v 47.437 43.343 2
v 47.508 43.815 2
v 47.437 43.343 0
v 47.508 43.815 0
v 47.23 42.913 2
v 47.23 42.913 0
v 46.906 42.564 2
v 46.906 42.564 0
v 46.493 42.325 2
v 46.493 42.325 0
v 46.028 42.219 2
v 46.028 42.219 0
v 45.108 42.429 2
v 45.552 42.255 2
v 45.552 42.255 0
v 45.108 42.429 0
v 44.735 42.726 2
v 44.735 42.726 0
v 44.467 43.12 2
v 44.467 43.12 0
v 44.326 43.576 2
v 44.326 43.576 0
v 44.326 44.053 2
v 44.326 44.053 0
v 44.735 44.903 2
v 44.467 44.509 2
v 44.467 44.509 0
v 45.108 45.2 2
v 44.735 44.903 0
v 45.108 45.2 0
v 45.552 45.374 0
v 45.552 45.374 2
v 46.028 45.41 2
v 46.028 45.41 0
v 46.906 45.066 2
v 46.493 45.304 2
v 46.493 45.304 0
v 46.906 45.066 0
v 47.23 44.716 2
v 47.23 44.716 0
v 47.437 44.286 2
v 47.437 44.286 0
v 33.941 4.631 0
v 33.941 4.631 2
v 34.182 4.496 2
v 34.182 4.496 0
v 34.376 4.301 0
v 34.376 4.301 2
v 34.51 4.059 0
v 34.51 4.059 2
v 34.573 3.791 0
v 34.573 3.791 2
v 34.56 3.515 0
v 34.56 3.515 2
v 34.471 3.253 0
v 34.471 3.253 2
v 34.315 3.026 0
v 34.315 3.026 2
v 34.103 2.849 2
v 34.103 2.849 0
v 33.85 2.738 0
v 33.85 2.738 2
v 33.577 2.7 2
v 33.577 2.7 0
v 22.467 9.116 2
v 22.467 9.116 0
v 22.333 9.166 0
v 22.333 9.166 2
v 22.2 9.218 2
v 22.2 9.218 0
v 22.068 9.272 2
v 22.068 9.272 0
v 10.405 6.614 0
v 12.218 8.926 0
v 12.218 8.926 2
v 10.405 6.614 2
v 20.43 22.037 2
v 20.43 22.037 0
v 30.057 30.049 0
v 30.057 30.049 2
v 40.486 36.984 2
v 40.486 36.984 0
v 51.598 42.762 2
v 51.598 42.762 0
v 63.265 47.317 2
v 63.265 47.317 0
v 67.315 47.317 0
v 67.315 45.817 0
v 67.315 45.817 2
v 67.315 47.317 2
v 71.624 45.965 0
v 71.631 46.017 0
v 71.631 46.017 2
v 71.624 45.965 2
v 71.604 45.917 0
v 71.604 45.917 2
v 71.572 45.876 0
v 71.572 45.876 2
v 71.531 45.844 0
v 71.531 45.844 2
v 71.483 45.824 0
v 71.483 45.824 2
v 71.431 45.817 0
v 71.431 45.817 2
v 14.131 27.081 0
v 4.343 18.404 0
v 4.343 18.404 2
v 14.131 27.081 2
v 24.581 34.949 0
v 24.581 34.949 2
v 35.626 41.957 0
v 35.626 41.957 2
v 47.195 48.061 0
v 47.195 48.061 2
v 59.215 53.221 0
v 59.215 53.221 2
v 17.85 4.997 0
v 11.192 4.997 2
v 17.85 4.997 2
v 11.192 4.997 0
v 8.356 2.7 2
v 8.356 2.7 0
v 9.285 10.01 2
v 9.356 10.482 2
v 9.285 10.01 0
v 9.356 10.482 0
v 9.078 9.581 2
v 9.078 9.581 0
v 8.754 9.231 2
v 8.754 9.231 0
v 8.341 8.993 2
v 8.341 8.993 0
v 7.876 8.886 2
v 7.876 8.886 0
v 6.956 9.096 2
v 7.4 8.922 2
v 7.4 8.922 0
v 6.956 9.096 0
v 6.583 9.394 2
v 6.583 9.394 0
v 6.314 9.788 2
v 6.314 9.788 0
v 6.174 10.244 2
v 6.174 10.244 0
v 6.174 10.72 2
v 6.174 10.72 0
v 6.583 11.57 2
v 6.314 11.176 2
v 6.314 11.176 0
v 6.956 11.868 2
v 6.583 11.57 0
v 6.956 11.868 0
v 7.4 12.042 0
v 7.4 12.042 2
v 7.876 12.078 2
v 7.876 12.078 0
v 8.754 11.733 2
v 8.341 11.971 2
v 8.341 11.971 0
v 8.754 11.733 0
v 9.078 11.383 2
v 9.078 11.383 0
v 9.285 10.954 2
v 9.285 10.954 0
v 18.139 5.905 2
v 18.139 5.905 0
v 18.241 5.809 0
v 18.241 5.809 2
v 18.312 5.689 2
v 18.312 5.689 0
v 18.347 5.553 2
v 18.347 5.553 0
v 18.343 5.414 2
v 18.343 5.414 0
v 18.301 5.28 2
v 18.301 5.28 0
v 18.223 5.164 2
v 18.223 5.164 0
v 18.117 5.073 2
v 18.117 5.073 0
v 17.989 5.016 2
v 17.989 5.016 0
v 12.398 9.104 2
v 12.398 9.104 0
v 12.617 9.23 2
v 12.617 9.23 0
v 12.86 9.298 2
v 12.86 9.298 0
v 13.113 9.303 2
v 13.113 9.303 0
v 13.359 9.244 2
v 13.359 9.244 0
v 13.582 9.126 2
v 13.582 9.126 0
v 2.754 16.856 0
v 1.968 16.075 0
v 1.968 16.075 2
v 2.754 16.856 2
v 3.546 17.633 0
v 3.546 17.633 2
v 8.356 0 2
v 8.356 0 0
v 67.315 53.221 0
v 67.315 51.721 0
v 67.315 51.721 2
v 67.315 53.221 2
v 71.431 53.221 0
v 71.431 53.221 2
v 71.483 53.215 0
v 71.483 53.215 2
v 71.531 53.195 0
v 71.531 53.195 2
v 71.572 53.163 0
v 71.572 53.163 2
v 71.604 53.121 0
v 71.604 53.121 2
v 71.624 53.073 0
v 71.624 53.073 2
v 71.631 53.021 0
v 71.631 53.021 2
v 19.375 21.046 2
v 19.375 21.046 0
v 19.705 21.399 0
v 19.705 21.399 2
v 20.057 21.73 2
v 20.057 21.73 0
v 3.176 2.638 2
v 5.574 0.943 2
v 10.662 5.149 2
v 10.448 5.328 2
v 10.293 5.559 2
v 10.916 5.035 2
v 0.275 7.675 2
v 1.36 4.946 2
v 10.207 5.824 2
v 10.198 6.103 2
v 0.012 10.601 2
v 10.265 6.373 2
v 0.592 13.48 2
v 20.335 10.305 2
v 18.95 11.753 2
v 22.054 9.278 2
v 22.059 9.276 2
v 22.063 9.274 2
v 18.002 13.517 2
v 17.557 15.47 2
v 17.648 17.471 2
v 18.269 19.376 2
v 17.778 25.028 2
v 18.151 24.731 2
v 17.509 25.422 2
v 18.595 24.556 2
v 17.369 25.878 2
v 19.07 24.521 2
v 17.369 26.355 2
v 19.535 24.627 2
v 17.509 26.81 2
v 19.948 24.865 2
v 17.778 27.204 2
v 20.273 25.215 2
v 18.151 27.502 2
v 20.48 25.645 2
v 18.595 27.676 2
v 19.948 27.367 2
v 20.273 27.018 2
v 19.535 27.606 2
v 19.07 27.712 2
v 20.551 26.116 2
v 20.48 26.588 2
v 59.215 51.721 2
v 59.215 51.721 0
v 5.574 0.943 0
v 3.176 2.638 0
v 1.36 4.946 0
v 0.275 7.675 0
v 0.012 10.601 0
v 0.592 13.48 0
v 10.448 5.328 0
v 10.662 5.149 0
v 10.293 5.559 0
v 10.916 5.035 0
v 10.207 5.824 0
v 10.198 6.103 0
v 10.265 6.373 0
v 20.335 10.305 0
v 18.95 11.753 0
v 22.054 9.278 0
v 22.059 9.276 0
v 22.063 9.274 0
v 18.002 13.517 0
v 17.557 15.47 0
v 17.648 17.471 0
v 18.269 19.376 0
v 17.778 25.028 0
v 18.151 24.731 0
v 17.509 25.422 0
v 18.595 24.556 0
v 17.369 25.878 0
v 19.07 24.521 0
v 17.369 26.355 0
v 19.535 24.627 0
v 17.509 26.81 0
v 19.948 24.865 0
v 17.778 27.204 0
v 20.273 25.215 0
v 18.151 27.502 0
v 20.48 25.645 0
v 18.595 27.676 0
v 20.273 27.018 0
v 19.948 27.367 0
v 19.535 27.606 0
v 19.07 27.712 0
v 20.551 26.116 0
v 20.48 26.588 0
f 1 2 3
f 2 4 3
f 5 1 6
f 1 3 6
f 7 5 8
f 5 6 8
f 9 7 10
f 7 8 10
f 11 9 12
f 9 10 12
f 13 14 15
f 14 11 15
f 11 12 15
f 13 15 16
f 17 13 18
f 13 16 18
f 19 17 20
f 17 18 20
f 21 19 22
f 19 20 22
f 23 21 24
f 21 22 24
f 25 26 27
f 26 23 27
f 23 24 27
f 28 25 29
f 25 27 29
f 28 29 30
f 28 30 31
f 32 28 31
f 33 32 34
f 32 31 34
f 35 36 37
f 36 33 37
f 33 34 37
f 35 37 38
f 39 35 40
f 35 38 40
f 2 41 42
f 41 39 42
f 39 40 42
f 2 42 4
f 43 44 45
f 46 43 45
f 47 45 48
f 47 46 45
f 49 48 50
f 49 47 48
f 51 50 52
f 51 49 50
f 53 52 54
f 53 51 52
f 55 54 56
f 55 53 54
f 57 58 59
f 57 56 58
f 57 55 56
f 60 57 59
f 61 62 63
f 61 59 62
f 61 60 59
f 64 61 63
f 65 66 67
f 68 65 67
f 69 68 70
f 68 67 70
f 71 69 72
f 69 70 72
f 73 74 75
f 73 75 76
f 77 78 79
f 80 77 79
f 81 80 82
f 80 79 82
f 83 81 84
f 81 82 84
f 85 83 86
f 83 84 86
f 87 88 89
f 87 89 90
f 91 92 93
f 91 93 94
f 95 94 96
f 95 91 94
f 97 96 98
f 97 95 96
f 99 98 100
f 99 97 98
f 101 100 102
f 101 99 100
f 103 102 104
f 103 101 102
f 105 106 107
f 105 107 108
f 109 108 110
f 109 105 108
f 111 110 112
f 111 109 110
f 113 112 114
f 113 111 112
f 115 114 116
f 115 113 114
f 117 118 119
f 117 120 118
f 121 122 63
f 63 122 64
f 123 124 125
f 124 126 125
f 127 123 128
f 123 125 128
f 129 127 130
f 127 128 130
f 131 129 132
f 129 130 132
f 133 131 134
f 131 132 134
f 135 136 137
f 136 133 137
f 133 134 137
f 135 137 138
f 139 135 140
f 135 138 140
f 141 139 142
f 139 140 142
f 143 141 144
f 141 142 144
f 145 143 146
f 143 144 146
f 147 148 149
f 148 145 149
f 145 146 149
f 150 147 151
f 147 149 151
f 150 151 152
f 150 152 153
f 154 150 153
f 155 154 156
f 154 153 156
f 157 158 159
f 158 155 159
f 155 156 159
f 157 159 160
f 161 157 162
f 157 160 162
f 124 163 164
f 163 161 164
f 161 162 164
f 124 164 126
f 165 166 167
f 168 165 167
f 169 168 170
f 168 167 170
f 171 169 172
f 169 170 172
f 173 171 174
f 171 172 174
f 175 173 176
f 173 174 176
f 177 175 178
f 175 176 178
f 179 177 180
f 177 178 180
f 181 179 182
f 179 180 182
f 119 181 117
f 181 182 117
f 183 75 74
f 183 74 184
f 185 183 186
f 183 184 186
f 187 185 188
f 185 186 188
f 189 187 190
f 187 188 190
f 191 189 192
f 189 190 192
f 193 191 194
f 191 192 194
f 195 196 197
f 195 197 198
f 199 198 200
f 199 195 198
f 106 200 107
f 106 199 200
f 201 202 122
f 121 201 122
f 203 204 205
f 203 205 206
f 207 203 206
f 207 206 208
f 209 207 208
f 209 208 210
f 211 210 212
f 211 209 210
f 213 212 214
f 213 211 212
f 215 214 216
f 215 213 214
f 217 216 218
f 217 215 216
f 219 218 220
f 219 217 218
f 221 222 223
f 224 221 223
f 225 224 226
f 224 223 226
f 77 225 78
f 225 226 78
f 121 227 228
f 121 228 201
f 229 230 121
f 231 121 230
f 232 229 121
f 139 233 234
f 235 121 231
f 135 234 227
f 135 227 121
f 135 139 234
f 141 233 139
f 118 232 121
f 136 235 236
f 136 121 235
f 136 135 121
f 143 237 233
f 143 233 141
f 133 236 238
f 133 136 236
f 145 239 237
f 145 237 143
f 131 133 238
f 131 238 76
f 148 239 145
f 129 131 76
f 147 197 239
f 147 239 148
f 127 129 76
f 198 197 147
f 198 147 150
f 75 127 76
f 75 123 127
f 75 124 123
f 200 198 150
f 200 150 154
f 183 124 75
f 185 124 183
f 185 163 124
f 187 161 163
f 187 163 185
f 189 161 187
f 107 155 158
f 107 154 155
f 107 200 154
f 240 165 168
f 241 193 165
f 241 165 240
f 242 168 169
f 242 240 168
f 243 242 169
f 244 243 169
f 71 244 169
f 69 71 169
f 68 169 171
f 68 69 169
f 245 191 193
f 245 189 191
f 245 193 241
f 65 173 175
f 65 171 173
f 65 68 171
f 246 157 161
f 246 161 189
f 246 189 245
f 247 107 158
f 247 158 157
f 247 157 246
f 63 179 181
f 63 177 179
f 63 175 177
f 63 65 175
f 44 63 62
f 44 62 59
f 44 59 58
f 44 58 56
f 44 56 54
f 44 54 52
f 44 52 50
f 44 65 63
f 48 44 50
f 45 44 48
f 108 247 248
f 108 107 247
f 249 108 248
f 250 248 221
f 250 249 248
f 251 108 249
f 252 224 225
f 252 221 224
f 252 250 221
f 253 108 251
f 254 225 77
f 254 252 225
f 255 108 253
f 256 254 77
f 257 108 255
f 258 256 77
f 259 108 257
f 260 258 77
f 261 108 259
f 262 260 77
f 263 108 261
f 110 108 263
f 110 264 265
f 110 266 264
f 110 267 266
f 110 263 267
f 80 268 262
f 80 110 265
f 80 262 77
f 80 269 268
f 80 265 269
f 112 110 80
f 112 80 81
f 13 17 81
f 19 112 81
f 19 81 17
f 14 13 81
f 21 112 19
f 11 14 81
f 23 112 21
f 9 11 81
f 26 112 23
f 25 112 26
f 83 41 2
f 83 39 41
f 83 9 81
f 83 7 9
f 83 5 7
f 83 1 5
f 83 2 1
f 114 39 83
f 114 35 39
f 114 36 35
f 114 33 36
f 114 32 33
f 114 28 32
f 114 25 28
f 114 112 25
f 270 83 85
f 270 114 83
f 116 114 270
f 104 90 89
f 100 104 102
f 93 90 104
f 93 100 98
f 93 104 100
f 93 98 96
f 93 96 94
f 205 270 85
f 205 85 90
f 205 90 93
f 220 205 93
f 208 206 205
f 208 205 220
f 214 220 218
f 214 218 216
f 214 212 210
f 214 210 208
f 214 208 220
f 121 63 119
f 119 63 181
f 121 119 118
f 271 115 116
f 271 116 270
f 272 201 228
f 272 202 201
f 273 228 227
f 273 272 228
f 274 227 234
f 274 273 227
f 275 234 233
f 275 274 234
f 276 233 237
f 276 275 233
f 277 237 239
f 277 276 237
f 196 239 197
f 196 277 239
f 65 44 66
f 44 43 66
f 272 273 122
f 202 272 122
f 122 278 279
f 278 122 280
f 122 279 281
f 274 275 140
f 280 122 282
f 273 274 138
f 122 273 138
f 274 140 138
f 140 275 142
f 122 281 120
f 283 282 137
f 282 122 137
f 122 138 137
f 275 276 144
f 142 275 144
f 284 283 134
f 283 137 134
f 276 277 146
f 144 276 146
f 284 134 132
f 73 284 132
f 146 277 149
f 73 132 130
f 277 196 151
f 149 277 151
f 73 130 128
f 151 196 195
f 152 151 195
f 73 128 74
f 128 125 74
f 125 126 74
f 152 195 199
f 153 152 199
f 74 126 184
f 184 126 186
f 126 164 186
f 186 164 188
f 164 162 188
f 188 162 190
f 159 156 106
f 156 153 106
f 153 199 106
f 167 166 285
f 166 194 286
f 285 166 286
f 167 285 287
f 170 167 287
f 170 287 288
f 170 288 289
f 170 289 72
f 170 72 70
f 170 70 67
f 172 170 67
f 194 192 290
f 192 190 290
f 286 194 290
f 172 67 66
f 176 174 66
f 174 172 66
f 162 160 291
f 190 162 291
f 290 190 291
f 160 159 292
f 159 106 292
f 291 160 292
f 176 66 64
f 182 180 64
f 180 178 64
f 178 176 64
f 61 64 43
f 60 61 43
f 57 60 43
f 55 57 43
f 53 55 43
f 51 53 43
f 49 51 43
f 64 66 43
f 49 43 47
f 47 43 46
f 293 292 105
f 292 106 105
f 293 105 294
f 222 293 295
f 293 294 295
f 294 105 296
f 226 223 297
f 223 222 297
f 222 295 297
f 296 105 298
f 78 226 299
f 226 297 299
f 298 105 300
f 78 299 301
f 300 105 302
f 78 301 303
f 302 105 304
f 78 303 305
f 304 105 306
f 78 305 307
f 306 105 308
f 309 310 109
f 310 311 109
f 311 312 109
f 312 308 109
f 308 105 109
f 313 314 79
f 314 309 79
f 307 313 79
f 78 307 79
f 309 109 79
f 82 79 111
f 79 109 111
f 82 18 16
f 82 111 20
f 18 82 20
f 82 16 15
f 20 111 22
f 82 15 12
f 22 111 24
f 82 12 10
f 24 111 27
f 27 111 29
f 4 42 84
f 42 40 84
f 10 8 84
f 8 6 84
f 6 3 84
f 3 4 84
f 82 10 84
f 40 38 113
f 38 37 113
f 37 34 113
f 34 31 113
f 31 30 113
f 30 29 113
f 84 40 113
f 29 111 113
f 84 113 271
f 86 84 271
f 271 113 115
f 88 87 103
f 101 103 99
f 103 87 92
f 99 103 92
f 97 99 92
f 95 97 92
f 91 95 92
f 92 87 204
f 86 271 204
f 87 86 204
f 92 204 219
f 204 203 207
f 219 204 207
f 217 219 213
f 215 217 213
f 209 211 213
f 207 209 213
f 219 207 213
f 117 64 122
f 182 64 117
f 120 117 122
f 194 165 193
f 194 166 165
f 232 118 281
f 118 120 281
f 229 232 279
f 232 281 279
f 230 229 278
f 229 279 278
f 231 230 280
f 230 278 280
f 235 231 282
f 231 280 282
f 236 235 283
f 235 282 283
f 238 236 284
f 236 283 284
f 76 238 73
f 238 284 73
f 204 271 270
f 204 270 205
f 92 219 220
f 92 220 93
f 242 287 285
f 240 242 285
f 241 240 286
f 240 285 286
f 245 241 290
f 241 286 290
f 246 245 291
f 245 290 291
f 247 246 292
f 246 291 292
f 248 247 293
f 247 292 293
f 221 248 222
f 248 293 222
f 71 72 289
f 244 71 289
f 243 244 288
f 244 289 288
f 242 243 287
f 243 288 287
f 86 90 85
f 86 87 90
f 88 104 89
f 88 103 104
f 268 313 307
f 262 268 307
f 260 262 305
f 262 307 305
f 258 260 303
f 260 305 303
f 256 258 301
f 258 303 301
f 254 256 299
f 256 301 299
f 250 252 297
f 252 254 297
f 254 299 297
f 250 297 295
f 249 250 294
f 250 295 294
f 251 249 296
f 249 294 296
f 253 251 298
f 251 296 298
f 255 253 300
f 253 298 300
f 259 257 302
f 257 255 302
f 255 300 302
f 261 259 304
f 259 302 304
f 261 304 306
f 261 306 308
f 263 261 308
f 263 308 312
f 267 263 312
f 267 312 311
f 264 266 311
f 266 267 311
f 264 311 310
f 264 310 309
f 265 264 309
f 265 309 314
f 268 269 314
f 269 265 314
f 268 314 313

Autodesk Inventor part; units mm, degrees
ref_plane "YZ Plane" through (0, 0, 0) normal (1, 0, 0) x (0, 1, 0)
ref_plane "XZ Plane" through (0, 0, 0) normal (0, 1, 0) x (-1, 0, 0)
ref_plane "XY Plane" through (0, 0, 0) normal (0, 0, 1) x (1, 0, 0)
sketch "Side Part" plane through (0, 0, 0) normal (0, 0, 1) x (1, 0, 0)
  arc A0 (59.2149, 53.2214) -> (1.9677, 16.0747) centre (117.7132, -99.6165) ccw
  arc A1 (63.2649, 47.3171) -> (19.3751, 21.046) centre (99.8299, -63.5681) ccw
  arc A2 (19.3751, 21.046) -> (22.0544, 9.2781) centre (24.9814, 16.1335) ccw
  arc A3 (1.9677, 16.0747) -> (8.356, 0) centre (10.2097, 10.0435) ccw
  circle A4 centre (18.9507, 26.1162) radius 1.6
  circle A5 centre (45.9082, 43.8146) radius 1.6
  line L0 (8.356, 0) -> (8.356, 2.7)
  line L1 (59.2149, 53.2214) -> (59.2149, 51.7214)
  line L2 (59.2149, 51.7214) -> (67.3149, 51.7214)
  line L3 (67.3149, 51.7214) -> (67.3149, 53.2214)
  line L4 (71.631, 46.0171) -> (71.631, 53.0214)
  line L5 (67.3149, 53.2214) -> (71.431, 53.2214)
  arc A6 (71.631, 53.0214) -> (71.431, 53.2214) centre (71.431, 53.0214) ccw
  arc A7 (22.0544, 9.2781) -> (22.0677, 9.2723) centre (22.1405, 9.4586) ccw
  circle A8 centre (7.756, 10.482) radius 1.6
  line L6 (12.2179, 8.9259) -> (10.405, 6.6138)
  arc A9 (10.405, 6.6138) -> (11.1919, 4.9967) centre (11.1919, 5.9967) ccw
  line L7 (11.1919, 4.9967) -> (17.8503, 4.9967)
  line L8 (18.1389, 5.9051) -> (13.582, 9.1255)
  arc A10 (17.8503, 4.9967) -> (18.1389, 5.9051) centre (17.8503, 5.4967) ccw
  arc A11 (13.582, 9.1255) -> (12.2179, 8.9259) centre (13.0048, 8.3088) ccw
  line L9 (8.356, 2.7) -> (33.5768, 2.7)
  arc A12 (33.5768, 2.7) -> (33.9408, 4.6314) centre (33.5768, 3.7) ccw
  line L10 (33.9408, 4.6314) -> (22.0677, 9.2723)
  line L11 (67.3149, 45.8171) -> (67.3149, 47.3171)
  line L12 (67.3149, 45.8171) -> (71.431, 45.8171)
  arc A13 (71.431, 45.8171) -> (71.631, 46.0171) centre (71.431, 46.0171) ccw
  line L13 (63.2649, 47.3171) -> (67.3149, 47.3171)
  point P0 (38.6259, 23.714)
sketch "Sketch1" plane through (0, 0, 0) normal (0, 0, 1) x (1, 0, 0)
  circle A0 centre (45.9082, 43.8146) radius 1.6
  circle A1 centre (18.9507, 26.1162) radius 1.6
  circle A2 centre (7.756, 10.482) radius 1.6
  arc A3 (10.405, 6.6138) -> (11.1919, 4.9967) centre (11.1919, 5.9967) ccw
  arc A4 (13.582, 9.1255) -> (12.2179, 8.9259) centre (13.0048, 8.3088) ccw
  arc A5 (17.8503, 4.9967) -> (18.1389, 5.9051) centre (17.8503, 5.4967) ccw
  arc A6 (20.4302, 22.0369) -> (22.4669, 9.1163) centre (24.9814, 16.1335) ccw
  arc A7 (33.5768, 2.7) -> (33.9408, 4.6314) centre (33.5768, 3.7) ccw
  arc A8 (4.3433, 18.4037) -> (8.356, 0) centre (10.2097, 10.0435) ccw
  line L0 (8.356, 0) -> (8.356, 2.7)
  line L1 (8.356, 2.7) -> (33.5768, 2.7)
  line L2 (33.9408, 4.6314) -> (22.4669, 9.1163)
  line L3 (18.1389, 5.9051) -> (13.582, 9.1255)
  line L4 (11.1919, 4.9967) -> (17.8503, 4.9967)
  line L5 (12.2179, 8.9259) -> (10.405, 6.6138)
  arc A9 (59.2149, 53.2214) -> (1.9677, 16.0747) centre (117.7132, -99.6165) ccw
  arc A10 (63.2649, 47.3171) -> (19.3751, 21.046) centre (99.8299, -63.5681) ccw
  line L6 (59.2149, 53.2214) -> (59.2149, 51.7214)
  line L7 (59.2149, 51.7214) -> (67.3149, 51.7214)
  line L8 (67.3149, 51.7214) -> (67.3149, 53.2214)
  arc A11 (71.631, 53.0214) -> (71.431, 53.2214) centre (71.431, 53.0214) ccw
  arc A12 (71.431, 45.8171) -> (71.631, 46.0171) centre (71.431, 46.0171) ccw
  line L9 (67.3149, 53.2214) -> (71.431, 53.2214)
  line L10 (71.631, 53.0214) -> (71.631, 46.0171)
  line L11 (71.431, 45.8171) -> (67.3149, 45.8171)
  line L12 (67.3149, 45.8171) -> (67.3149, 47.3171)
  line L13 (67.3149, 47.3171) -> (63.2649, 47.3171)
  arc A13 (59.2149, 53.2214) -> (1.9677, 16.0747) centre (117.7132, -99.6165) ccw
  arc A14 (63.2649, 47.3171) -> (19.3751, 21.046) centre (99.8299, -63.5681) ccw
  arc A15 (19.3751, 21.046) -> (22.0544, 9.2781) centre (24.9814, 16.1335) ccw
  arc A16 (1.9677, 16.0747) -> (8.356, 0) centre (10.2097, 10.0435) ccw
  circle A17 centre (18.9507, 26.1162) radius 1.6
  circle A18 centre (45.9082, 43.8146) radius 1.6
  line L14 (8.356, 0) -> (8.356, 2.7)
  line L15 (59.2149, 53.2214) -> (59.2149, 51.7214)
  line L16 (59.2149, 51.7214) -> (67.3149, 51.7214)
  line L17 (67.3149, 51.7214) -> (67.3149, 53.2214)
  line L18 (71.631, 46.0171) -> (71.631, 53.0214)
  line L19 (67.3149, 53.2214) -> (71.431, 53.2214)
  arc A19 (71.631, 53.0214) -> (71.431, 53.2214) centre (71.431, 53.0214) ccw
  arc A20 (22.0544, 9.2781) -> (22.0677, 9.2723) centre (22.1405, 9.4586) ccw
  circle A21 centre (7.756, 10.482) radius 1.6
  line L20 (12.2179, 8.9259) -> (10.405, 6.6138)
  arc A22 (10.405, 6.6138) -> (11.1919, 4.9967) centre (11.1919, 5.9967) ccw
  line L21 (11.1919, 4.9967) -> (17.8503, 4.9967)
  line L22 (18.1389, 5.9051) -> (13.582, 9.1255)
  arc A23 (17.8503, 4.9967) -> (18.1389, 5.9051) centre (17.8503, 5.4967) ccw
  arc A24 (13.582, 9.1255) -> (12.2179, 8.9259) centre (13.0048, 8.3088) ccw
  line L23 (8.356, 2.7) -> (33.5768, 2.7)
  arc A25 (33.5768, 2.7) -> (33.9408, 4.6314) centre (33.5768, 3.7) ccw
  line L24 (33.9408, 4.6314) -> (22.0677, 9.2723)
  line L25 (67.3149, 45.8171) -> (67.3149, 47.3171)
  line L26 (67.3149, 45.8171) -> (71.431, 45.8171)
  arc A26 (71.431, 45.8171) -> (71.631, 46.0171) centre (71.431, 46.0171) ccw
  line L27 (63.2649, 47.3171) -> (67.3149, 47.3171)
  point P0 (0, 0)
extrude "Extrusion1" add sketch "Sketch1" along normal blind 2 contours A6 L2 A7 L1 L0 A8 A9 L6 L7 L8 L9 A11 L10 A12 L11 L12 L13 A10
properties part number "Side_Part"
